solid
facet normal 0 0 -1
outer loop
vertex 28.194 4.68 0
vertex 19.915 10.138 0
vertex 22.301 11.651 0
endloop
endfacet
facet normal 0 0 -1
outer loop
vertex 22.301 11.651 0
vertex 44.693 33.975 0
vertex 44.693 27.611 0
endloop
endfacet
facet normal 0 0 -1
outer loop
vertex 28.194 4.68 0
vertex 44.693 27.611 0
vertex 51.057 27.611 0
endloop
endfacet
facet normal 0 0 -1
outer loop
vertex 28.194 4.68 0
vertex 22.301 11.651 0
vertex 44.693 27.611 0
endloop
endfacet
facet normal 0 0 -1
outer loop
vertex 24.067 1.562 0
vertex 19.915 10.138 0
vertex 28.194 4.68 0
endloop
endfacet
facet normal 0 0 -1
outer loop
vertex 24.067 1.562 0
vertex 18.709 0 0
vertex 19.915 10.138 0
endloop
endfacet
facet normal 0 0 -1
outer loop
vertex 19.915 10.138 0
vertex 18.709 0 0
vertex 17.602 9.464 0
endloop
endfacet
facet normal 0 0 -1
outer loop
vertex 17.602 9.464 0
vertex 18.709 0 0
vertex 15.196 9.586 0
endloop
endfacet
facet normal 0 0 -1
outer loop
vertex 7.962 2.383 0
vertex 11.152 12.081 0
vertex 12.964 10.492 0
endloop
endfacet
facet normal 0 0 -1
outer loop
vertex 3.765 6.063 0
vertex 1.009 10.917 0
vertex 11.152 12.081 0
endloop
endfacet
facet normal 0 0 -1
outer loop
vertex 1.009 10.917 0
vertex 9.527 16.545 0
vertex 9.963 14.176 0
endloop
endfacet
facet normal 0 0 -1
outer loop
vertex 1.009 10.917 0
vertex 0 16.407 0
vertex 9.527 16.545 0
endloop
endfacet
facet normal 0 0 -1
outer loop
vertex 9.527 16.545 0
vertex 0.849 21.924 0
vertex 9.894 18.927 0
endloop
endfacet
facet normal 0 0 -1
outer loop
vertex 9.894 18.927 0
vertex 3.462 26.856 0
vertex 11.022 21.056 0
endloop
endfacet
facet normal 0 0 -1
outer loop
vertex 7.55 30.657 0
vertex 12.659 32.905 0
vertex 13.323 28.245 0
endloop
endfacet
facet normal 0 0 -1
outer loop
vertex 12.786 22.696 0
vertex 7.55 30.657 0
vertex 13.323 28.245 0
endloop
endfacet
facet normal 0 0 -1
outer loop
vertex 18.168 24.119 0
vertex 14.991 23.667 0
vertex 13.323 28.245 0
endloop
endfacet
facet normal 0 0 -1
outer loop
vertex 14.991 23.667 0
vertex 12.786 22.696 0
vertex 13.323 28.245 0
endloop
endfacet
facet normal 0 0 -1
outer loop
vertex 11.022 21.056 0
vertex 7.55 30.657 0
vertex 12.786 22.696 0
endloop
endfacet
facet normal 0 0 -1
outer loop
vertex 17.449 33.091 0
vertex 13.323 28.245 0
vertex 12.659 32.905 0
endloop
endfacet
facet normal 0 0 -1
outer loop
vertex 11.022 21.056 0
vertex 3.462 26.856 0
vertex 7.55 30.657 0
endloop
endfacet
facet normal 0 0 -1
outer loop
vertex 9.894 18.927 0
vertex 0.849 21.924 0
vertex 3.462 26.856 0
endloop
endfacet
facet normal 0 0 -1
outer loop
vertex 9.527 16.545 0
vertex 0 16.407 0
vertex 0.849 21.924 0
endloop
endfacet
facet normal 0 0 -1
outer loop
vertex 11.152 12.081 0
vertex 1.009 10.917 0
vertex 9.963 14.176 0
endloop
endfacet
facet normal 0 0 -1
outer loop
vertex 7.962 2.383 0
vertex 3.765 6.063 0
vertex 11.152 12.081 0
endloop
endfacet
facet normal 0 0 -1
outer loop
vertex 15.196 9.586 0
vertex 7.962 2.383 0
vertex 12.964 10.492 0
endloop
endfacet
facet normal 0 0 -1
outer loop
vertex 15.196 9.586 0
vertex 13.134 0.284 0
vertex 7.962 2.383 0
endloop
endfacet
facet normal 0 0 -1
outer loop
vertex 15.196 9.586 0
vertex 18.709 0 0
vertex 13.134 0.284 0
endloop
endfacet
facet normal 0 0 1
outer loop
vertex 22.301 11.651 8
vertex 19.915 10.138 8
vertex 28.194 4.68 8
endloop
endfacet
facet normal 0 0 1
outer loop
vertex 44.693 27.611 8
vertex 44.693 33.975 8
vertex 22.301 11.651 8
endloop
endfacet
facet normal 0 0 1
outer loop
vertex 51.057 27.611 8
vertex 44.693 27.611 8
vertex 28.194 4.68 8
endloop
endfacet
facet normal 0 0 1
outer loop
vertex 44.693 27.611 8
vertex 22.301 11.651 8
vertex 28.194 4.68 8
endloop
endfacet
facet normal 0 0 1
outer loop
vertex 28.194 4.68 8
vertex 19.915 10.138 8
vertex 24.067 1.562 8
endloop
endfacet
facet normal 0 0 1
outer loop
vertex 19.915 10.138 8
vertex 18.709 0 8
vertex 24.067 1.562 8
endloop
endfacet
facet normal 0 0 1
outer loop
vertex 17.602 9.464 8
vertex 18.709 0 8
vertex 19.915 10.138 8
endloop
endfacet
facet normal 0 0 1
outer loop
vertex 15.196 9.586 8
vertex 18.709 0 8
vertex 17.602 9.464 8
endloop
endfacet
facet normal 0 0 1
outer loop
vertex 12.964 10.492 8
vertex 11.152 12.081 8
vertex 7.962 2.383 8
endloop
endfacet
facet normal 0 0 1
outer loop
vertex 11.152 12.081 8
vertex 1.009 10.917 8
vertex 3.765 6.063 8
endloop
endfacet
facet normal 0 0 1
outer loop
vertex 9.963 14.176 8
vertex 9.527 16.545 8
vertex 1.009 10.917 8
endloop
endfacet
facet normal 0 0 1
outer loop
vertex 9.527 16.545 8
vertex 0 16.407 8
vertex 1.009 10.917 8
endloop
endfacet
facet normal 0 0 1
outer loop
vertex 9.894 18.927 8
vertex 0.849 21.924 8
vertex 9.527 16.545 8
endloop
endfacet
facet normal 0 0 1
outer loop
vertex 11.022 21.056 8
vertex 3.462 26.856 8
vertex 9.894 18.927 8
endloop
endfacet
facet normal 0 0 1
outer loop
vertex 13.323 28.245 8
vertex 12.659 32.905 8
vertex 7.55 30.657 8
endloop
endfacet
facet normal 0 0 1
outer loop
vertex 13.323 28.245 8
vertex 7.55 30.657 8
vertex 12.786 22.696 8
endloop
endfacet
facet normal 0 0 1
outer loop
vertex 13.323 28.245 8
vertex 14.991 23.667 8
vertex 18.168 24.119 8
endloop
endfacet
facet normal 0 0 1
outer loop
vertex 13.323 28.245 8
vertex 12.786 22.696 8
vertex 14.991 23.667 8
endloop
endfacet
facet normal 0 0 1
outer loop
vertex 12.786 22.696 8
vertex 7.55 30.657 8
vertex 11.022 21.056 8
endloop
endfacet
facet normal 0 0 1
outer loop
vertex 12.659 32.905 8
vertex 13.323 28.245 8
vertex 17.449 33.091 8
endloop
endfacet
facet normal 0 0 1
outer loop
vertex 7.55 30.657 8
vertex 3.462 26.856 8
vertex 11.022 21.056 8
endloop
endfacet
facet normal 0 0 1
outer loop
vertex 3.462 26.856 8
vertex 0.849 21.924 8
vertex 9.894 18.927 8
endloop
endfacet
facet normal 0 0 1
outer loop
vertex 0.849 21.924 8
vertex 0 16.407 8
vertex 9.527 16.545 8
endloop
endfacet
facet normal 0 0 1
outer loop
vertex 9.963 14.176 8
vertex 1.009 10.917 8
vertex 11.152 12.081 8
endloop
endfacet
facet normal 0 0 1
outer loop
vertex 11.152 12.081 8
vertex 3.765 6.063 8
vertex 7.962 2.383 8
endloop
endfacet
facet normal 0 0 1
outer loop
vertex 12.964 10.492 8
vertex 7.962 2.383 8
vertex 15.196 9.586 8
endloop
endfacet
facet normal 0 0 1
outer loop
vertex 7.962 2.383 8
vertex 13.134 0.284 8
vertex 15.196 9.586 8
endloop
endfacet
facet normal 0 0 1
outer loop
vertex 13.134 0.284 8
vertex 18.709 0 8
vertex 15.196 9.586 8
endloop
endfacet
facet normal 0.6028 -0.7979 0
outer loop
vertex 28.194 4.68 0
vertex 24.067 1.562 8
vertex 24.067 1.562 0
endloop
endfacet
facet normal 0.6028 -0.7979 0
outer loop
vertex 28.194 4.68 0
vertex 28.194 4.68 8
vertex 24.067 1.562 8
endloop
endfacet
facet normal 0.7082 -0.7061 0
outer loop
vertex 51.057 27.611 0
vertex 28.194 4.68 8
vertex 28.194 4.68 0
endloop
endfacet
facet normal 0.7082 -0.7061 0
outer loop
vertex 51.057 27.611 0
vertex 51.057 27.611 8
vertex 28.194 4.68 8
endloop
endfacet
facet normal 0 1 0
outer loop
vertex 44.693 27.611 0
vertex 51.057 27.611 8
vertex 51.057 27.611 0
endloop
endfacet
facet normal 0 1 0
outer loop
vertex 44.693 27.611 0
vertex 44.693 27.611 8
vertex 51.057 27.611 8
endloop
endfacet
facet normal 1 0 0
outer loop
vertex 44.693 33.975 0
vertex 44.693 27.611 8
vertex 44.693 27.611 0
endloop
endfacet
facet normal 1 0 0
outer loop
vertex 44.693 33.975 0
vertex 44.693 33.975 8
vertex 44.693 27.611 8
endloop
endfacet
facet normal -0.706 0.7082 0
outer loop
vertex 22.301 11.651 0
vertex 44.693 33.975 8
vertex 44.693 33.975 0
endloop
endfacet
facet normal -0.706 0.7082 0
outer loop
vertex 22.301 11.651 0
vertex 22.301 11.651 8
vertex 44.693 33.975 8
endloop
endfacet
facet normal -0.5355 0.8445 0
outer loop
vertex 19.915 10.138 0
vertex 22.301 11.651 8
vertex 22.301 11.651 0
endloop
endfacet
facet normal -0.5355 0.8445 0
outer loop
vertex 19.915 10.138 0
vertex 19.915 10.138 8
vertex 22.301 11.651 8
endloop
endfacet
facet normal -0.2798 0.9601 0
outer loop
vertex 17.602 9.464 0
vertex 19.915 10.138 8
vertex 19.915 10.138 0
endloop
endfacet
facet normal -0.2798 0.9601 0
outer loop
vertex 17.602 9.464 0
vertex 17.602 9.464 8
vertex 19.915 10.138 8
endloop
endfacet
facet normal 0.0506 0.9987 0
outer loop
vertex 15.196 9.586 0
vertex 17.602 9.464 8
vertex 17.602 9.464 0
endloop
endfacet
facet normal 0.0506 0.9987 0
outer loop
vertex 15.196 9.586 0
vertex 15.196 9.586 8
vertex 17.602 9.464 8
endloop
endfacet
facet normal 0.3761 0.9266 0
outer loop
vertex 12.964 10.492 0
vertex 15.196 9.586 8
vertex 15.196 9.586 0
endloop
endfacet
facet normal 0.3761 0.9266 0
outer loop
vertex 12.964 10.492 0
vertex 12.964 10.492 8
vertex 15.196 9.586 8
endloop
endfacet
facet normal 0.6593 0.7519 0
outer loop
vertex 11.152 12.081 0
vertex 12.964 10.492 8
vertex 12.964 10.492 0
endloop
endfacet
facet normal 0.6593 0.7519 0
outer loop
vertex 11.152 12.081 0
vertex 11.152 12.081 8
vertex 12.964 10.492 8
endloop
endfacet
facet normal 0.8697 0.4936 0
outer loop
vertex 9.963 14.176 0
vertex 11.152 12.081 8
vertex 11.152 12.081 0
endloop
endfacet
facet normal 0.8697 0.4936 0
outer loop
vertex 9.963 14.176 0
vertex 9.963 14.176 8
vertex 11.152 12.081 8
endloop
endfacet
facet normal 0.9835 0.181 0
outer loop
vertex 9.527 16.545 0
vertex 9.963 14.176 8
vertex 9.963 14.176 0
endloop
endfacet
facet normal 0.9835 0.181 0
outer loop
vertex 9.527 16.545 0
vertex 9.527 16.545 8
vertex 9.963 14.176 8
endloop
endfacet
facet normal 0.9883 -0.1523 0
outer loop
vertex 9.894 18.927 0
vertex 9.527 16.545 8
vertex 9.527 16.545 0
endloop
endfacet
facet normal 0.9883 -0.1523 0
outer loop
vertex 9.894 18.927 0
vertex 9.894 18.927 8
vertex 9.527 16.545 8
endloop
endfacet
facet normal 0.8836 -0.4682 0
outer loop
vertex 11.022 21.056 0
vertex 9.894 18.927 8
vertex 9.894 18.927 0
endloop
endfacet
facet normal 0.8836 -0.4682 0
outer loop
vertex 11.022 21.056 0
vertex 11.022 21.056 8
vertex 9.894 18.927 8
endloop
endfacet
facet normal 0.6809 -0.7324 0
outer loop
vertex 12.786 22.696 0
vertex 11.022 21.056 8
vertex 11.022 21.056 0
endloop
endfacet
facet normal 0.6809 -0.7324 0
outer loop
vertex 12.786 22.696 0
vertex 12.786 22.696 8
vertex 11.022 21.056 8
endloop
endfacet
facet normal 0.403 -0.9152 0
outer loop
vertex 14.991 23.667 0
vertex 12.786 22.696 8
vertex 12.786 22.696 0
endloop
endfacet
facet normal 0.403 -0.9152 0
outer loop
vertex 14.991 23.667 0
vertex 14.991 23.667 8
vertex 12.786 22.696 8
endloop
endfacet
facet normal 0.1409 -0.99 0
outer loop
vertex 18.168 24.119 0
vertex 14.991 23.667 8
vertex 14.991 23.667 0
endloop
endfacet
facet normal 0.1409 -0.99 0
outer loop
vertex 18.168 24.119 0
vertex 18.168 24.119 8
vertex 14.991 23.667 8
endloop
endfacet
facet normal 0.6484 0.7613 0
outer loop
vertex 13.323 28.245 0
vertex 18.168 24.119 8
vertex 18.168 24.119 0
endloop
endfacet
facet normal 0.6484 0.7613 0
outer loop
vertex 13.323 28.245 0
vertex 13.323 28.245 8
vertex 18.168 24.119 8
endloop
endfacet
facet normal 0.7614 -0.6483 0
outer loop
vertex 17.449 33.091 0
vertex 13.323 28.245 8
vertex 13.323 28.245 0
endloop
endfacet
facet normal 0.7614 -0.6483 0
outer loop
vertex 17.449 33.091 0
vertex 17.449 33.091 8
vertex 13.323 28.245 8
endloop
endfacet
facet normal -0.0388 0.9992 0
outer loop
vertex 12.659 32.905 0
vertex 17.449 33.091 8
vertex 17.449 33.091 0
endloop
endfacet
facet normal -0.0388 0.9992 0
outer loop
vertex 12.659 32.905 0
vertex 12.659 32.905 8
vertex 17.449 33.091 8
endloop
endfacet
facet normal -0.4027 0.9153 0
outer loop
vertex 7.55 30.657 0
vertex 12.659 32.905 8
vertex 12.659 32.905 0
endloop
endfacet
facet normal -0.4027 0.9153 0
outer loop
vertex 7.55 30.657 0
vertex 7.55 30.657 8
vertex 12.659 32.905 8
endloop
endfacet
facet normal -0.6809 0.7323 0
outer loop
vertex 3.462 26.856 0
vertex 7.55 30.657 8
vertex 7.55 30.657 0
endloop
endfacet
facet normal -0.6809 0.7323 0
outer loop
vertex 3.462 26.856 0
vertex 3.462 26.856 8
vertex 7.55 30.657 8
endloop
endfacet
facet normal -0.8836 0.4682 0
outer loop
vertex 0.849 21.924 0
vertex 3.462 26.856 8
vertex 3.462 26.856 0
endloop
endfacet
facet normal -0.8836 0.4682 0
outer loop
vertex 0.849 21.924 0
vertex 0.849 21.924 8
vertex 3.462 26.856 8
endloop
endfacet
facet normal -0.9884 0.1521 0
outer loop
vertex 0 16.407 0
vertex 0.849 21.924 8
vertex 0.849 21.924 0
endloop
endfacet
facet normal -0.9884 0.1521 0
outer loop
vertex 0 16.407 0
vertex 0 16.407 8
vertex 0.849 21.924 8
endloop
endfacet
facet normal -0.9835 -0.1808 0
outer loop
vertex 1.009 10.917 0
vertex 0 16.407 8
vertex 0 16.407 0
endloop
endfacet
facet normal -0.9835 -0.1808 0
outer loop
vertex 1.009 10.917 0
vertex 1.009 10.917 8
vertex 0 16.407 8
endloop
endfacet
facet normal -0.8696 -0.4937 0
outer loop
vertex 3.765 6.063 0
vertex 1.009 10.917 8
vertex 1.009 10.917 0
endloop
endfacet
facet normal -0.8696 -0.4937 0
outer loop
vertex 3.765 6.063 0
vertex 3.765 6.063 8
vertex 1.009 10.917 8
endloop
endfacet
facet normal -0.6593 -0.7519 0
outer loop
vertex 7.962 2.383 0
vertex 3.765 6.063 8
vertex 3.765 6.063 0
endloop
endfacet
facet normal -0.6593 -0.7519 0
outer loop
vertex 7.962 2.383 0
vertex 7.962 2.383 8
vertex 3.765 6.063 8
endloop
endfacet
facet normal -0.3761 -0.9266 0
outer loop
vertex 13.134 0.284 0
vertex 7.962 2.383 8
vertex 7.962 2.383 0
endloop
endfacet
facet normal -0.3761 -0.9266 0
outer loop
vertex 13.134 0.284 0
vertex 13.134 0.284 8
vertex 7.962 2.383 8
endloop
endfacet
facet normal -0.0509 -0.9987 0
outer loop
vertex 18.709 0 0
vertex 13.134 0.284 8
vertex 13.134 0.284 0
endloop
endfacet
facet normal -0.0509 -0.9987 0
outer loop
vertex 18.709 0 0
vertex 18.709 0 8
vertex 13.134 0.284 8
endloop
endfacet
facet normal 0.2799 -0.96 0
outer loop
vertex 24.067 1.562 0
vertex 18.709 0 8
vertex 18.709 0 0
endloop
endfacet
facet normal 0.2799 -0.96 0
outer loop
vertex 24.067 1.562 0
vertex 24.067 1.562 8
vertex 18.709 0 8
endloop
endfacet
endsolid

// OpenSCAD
$fn = 32;

// ----------------------------------------------------------------------
// Eye lug: ring_tail, 8 mm thick
// ----------------------------------------------------------------------

// --- parameters (mm) ---
profile_height = 8;       // extrusion height
profile_points = 30;      // points of the closed outline

profile = [[13.323, 28.245], [17.449, 33.091], [12.659, 32.905], [7.55, 30.657], [3.462, 26.856], [0.849, 21.924], [0, 16.407], [1.009, 10.917], [3.765, 6.063], [7.962, 2.383], [13.134, 0.284], [18.709, 0], [24.067, 1.562], [28.194, 4.68], [51.057, 27.611], [44.693, 27.611], [44.693, 33.975], [22.301, 11.651], [19.915, 10.138], [17.602, 9.464], [15.196, 9.586], [12.964, 10.492], [11.152, 12.081], [9.963, 14.176], [9.527, 16.545], [9.894, 18.927], [11.022, 21.056], [12.786, 22.696], [14.991, 23.667], [18.168, 24.119]];  // single closed polygon, 30 points, counter clockwise

// --- the one profile operation ---
linear_extrude(height = profile_height) polygon(points = profile);
